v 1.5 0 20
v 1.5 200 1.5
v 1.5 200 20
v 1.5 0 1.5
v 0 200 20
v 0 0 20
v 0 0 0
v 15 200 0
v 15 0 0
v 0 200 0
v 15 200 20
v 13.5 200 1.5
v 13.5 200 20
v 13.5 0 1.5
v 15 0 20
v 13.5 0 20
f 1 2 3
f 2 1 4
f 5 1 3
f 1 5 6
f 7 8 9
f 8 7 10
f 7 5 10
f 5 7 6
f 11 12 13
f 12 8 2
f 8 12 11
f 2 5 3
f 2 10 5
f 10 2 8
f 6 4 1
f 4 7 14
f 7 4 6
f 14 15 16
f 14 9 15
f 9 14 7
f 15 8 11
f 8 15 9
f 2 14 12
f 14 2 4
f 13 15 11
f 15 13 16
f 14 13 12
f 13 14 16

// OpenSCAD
module LProfile(x=10,y=10,w=1.5,len=200)
{
	color("silver")
	{
		cube([w,len,x]);
		cube([y,len,w]);
	}
}


module CProfile(x=10,y=10,w=1.5,len=200)
{
	color("silver")
	{
		cube([w,len,x]);
		cube([y,len,w]);
		translate([y-w,0,0]) cube([w,len,x]);
	}
}

//LProfile(20,15,1.5);
CProfile(20,15,1.5);
